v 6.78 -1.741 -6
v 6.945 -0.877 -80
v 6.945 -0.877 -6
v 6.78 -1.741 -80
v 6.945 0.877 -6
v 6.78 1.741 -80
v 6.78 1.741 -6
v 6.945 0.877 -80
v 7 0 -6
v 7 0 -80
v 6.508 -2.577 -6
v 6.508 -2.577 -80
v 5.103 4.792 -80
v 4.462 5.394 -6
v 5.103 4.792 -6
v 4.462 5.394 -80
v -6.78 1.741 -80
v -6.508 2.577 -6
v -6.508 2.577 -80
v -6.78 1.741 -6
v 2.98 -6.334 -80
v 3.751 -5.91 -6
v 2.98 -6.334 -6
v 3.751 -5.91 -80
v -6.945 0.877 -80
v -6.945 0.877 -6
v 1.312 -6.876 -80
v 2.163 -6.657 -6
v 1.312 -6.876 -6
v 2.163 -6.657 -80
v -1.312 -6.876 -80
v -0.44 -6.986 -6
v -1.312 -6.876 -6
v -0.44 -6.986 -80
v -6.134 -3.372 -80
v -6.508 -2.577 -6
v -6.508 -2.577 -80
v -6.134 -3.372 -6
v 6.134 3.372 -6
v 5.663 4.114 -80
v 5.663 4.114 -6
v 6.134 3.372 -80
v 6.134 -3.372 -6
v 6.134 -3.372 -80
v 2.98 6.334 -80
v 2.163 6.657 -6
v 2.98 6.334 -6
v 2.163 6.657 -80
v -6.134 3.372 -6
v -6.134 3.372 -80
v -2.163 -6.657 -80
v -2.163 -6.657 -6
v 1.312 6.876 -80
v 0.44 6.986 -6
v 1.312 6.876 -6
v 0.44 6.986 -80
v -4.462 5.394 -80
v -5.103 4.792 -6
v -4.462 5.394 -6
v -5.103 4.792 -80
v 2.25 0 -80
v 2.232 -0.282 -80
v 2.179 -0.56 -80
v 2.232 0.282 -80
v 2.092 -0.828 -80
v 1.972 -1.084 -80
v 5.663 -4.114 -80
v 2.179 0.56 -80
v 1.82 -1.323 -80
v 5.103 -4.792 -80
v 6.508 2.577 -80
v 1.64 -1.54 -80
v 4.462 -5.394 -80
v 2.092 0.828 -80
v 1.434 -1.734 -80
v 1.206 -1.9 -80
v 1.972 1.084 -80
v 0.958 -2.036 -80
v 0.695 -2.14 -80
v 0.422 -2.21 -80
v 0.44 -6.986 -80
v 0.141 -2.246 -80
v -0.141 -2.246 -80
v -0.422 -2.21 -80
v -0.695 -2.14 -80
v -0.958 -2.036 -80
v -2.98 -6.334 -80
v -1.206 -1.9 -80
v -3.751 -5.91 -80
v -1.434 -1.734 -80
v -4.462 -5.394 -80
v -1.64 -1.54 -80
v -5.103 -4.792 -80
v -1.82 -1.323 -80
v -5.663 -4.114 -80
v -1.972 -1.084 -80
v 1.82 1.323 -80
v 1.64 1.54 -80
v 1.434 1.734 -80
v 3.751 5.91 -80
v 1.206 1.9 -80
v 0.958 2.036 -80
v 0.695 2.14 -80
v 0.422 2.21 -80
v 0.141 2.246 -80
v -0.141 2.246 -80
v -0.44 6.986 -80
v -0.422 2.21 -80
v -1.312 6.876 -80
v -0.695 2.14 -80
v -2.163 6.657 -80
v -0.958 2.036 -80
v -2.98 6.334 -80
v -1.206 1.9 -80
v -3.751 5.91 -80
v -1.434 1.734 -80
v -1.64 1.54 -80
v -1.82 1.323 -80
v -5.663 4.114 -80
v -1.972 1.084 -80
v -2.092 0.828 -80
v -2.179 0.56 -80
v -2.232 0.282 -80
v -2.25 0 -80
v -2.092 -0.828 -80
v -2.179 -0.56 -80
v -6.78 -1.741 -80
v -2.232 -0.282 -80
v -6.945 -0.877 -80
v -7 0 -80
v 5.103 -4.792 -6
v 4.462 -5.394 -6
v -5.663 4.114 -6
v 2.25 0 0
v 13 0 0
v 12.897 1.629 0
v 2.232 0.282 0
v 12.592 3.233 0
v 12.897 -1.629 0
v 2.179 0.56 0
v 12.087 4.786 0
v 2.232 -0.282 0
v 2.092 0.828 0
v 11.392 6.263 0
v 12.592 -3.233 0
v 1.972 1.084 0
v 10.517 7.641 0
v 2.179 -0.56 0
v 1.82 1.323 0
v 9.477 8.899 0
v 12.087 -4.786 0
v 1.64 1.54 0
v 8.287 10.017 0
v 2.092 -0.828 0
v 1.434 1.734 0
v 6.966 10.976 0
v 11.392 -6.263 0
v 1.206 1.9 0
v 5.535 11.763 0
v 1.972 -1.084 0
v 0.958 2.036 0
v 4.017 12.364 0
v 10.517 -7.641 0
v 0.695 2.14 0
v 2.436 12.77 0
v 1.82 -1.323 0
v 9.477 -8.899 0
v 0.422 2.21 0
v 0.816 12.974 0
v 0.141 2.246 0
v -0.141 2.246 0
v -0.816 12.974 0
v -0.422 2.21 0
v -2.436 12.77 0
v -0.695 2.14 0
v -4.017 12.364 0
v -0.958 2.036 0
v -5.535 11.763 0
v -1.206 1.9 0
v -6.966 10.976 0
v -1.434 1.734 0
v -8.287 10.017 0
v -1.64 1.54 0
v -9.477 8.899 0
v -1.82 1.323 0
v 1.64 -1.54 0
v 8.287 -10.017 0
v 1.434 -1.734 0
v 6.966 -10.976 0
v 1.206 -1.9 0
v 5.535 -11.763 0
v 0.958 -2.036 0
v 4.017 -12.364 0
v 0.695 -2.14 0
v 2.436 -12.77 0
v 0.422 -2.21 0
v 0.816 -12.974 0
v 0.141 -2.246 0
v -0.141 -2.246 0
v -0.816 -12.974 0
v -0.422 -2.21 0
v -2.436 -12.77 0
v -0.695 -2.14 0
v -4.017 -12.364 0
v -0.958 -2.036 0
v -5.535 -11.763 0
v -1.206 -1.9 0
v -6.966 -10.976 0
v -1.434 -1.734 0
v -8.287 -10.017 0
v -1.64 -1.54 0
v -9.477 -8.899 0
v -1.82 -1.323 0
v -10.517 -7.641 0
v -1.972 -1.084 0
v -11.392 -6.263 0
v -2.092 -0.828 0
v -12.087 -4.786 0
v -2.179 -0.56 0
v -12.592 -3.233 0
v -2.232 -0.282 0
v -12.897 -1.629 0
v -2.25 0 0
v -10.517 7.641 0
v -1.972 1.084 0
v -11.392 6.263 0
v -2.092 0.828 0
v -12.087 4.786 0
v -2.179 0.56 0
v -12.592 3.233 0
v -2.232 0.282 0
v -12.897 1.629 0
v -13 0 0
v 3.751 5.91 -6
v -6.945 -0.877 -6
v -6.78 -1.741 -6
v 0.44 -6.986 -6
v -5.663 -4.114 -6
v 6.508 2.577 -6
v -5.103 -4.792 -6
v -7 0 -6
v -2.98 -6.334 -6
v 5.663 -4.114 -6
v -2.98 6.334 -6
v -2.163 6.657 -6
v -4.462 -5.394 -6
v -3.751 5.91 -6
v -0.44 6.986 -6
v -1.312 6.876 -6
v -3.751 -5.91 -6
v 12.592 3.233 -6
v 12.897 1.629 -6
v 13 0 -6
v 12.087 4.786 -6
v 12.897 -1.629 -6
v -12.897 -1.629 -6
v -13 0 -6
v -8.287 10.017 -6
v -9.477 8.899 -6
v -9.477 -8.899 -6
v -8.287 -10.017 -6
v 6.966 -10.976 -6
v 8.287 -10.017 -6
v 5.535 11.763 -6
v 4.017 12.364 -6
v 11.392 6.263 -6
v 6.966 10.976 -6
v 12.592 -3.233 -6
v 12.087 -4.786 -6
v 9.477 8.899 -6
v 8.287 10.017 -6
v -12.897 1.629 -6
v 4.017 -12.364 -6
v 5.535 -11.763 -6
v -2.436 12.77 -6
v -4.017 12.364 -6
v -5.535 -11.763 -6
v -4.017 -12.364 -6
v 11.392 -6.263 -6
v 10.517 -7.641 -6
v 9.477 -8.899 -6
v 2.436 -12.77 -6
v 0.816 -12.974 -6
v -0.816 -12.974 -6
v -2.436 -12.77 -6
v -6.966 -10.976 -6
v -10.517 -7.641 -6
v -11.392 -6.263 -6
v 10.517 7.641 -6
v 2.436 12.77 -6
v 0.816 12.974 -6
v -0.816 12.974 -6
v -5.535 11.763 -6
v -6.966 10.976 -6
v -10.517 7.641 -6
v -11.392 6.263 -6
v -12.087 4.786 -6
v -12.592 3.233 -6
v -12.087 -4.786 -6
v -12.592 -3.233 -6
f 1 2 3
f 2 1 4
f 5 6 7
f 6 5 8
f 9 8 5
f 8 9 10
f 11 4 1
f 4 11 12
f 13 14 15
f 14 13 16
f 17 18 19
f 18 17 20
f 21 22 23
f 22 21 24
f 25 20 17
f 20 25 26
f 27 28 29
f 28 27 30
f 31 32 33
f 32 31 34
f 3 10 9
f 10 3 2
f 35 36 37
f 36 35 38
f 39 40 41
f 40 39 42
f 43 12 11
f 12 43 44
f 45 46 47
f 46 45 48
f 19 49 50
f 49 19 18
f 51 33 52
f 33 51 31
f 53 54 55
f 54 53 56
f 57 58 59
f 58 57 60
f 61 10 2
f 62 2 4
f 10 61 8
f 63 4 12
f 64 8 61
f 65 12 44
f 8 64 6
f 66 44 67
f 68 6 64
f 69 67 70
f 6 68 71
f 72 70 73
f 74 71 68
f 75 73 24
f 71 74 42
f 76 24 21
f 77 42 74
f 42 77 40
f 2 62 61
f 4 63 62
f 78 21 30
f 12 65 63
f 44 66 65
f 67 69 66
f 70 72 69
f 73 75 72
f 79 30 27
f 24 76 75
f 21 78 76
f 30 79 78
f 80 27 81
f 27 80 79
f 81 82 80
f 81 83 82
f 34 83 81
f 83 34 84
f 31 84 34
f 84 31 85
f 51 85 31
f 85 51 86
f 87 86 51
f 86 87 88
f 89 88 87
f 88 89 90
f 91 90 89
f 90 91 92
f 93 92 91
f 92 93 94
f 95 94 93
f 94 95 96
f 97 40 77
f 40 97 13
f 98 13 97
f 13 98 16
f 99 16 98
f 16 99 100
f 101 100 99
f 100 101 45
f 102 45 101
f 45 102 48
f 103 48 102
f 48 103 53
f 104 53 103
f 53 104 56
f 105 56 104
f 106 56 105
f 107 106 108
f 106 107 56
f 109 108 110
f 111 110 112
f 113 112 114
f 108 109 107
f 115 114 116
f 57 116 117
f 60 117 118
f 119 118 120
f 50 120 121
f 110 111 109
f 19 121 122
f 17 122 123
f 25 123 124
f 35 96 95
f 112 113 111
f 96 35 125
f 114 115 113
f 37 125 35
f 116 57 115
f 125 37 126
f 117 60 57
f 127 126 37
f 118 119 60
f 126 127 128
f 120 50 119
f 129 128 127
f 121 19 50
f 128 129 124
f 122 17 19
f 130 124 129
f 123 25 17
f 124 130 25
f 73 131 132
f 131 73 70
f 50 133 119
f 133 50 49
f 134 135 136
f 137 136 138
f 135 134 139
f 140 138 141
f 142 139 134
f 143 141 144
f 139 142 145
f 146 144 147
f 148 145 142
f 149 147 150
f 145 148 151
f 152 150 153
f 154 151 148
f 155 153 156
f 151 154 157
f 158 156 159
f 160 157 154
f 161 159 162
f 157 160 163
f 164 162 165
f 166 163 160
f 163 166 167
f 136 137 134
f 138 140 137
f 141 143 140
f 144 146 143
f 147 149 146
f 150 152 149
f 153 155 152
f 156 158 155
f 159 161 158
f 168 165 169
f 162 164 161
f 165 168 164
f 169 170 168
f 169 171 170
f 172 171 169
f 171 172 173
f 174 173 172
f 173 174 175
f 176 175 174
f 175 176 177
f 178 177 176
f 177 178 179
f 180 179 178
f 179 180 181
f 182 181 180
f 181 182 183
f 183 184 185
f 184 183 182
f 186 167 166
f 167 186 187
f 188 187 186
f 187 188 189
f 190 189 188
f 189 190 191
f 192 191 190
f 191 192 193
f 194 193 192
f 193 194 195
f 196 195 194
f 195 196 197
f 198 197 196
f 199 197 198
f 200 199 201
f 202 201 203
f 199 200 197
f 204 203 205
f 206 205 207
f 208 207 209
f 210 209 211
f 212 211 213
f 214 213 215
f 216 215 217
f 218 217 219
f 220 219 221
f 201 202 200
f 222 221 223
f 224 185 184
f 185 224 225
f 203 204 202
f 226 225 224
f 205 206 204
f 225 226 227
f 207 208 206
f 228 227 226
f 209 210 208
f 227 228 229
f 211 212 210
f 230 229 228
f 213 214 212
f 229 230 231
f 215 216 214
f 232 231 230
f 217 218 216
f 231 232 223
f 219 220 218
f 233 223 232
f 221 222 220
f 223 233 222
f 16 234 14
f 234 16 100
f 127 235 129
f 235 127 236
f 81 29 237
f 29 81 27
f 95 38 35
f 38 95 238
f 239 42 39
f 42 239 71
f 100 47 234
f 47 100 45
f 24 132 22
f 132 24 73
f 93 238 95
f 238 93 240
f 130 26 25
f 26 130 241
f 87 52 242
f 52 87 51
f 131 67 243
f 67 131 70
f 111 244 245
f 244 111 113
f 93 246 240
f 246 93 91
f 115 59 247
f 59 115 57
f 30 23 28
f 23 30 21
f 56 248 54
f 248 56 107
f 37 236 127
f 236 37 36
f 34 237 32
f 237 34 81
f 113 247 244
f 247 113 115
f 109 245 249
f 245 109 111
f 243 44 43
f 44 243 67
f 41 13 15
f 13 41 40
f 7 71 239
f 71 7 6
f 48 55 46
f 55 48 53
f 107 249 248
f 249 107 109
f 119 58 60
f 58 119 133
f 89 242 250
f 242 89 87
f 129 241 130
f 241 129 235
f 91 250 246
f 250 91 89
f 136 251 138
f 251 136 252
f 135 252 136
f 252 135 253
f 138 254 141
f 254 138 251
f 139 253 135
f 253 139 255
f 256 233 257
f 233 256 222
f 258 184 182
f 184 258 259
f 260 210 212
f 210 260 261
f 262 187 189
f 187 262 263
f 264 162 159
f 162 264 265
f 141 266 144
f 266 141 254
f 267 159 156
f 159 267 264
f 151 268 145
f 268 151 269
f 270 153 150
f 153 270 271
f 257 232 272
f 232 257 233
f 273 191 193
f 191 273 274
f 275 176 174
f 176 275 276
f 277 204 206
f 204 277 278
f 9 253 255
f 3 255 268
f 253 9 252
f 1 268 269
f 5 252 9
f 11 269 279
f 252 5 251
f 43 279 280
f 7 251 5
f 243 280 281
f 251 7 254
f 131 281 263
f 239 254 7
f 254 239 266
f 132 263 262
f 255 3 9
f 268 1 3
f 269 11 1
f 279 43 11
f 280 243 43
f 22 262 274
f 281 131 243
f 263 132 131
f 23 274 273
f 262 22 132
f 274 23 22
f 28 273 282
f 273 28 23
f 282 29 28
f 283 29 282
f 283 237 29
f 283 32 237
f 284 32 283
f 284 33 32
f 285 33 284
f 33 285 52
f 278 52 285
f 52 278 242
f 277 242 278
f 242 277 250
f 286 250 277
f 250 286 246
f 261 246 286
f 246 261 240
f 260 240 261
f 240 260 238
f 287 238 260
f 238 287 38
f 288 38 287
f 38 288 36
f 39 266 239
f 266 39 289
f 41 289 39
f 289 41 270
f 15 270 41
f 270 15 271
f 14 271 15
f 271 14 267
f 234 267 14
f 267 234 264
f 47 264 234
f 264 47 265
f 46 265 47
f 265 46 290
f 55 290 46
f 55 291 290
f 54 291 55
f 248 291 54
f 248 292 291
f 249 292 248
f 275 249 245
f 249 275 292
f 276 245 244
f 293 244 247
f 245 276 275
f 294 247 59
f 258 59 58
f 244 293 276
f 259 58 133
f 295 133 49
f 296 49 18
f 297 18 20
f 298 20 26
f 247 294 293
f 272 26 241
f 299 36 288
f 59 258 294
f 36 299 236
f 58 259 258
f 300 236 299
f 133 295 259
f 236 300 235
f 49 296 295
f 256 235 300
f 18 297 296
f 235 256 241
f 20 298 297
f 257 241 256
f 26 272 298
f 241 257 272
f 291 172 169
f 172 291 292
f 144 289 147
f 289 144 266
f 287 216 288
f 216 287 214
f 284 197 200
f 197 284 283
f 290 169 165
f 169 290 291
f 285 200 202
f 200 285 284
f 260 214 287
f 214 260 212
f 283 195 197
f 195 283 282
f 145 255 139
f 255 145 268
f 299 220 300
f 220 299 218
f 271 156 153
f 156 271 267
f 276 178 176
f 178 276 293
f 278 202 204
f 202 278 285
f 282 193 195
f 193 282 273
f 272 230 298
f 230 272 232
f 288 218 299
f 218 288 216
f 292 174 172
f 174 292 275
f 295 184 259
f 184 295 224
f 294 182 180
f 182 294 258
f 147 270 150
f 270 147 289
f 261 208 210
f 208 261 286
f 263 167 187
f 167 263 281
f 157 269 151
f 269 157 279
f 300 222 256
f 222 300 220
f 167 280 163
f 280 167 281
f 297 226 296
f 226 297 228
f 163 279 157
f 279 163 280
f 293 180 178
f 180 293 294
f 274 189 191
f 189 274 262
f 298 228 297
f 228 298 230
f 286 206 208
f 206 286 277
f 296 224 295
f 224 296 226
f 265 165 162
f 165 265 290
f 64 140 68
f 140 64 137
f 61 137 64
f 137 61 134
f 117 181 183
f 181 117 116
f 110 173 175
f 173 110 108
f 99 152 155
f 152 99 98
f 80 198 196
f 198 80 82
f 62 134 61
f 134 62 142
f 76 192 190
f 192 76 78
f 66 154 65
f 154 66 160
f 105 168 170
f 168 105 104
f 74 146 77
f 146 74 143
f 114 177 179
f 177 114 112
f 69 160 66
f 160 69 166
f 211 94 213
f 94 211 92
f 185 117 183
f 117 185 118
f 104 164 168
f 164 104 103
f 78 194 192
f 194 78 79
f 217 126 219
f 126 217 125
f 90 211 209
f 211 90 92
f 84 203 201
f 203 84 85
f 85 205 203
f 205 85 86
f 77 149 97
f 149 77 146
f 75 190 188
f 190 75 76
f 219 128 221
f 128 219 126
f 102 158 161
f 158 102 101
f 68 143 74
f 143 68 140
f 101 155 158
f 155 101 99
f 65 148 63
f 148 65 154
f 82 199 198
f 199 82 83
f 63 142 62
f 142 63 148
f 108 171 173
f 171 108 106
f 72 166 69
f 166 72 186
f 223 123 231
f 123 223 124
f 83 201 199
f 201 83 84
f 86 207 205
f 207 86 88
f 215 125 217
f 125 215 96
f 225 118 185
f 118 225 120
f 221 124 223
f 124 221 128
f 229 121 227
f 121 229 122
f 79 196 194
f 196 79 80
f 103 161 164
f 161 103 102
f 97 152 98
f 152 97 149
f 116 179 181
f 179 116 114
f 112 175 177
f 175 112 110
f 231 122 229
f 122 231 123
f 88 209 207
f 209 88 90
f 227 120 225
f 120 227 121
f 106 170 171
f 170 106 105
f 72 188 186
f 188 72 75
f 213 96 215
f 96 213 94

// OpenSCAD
$fn = 50;


difference() {
	union() {
		translate(v = [0, 0, -80.0000000000]) {
			cylinder(h = 80, r = 7.0000000000);
		}
		translate(v = [0, 0, -6.0000000000]) {
			cylinder(h = 6, r = 13.0000000000);
		}
	}
	union() {
		#translate(v = [0, 0, -80]) {
			cylinder(h = 80, r = 2.2500000000);
		}
	}
}
